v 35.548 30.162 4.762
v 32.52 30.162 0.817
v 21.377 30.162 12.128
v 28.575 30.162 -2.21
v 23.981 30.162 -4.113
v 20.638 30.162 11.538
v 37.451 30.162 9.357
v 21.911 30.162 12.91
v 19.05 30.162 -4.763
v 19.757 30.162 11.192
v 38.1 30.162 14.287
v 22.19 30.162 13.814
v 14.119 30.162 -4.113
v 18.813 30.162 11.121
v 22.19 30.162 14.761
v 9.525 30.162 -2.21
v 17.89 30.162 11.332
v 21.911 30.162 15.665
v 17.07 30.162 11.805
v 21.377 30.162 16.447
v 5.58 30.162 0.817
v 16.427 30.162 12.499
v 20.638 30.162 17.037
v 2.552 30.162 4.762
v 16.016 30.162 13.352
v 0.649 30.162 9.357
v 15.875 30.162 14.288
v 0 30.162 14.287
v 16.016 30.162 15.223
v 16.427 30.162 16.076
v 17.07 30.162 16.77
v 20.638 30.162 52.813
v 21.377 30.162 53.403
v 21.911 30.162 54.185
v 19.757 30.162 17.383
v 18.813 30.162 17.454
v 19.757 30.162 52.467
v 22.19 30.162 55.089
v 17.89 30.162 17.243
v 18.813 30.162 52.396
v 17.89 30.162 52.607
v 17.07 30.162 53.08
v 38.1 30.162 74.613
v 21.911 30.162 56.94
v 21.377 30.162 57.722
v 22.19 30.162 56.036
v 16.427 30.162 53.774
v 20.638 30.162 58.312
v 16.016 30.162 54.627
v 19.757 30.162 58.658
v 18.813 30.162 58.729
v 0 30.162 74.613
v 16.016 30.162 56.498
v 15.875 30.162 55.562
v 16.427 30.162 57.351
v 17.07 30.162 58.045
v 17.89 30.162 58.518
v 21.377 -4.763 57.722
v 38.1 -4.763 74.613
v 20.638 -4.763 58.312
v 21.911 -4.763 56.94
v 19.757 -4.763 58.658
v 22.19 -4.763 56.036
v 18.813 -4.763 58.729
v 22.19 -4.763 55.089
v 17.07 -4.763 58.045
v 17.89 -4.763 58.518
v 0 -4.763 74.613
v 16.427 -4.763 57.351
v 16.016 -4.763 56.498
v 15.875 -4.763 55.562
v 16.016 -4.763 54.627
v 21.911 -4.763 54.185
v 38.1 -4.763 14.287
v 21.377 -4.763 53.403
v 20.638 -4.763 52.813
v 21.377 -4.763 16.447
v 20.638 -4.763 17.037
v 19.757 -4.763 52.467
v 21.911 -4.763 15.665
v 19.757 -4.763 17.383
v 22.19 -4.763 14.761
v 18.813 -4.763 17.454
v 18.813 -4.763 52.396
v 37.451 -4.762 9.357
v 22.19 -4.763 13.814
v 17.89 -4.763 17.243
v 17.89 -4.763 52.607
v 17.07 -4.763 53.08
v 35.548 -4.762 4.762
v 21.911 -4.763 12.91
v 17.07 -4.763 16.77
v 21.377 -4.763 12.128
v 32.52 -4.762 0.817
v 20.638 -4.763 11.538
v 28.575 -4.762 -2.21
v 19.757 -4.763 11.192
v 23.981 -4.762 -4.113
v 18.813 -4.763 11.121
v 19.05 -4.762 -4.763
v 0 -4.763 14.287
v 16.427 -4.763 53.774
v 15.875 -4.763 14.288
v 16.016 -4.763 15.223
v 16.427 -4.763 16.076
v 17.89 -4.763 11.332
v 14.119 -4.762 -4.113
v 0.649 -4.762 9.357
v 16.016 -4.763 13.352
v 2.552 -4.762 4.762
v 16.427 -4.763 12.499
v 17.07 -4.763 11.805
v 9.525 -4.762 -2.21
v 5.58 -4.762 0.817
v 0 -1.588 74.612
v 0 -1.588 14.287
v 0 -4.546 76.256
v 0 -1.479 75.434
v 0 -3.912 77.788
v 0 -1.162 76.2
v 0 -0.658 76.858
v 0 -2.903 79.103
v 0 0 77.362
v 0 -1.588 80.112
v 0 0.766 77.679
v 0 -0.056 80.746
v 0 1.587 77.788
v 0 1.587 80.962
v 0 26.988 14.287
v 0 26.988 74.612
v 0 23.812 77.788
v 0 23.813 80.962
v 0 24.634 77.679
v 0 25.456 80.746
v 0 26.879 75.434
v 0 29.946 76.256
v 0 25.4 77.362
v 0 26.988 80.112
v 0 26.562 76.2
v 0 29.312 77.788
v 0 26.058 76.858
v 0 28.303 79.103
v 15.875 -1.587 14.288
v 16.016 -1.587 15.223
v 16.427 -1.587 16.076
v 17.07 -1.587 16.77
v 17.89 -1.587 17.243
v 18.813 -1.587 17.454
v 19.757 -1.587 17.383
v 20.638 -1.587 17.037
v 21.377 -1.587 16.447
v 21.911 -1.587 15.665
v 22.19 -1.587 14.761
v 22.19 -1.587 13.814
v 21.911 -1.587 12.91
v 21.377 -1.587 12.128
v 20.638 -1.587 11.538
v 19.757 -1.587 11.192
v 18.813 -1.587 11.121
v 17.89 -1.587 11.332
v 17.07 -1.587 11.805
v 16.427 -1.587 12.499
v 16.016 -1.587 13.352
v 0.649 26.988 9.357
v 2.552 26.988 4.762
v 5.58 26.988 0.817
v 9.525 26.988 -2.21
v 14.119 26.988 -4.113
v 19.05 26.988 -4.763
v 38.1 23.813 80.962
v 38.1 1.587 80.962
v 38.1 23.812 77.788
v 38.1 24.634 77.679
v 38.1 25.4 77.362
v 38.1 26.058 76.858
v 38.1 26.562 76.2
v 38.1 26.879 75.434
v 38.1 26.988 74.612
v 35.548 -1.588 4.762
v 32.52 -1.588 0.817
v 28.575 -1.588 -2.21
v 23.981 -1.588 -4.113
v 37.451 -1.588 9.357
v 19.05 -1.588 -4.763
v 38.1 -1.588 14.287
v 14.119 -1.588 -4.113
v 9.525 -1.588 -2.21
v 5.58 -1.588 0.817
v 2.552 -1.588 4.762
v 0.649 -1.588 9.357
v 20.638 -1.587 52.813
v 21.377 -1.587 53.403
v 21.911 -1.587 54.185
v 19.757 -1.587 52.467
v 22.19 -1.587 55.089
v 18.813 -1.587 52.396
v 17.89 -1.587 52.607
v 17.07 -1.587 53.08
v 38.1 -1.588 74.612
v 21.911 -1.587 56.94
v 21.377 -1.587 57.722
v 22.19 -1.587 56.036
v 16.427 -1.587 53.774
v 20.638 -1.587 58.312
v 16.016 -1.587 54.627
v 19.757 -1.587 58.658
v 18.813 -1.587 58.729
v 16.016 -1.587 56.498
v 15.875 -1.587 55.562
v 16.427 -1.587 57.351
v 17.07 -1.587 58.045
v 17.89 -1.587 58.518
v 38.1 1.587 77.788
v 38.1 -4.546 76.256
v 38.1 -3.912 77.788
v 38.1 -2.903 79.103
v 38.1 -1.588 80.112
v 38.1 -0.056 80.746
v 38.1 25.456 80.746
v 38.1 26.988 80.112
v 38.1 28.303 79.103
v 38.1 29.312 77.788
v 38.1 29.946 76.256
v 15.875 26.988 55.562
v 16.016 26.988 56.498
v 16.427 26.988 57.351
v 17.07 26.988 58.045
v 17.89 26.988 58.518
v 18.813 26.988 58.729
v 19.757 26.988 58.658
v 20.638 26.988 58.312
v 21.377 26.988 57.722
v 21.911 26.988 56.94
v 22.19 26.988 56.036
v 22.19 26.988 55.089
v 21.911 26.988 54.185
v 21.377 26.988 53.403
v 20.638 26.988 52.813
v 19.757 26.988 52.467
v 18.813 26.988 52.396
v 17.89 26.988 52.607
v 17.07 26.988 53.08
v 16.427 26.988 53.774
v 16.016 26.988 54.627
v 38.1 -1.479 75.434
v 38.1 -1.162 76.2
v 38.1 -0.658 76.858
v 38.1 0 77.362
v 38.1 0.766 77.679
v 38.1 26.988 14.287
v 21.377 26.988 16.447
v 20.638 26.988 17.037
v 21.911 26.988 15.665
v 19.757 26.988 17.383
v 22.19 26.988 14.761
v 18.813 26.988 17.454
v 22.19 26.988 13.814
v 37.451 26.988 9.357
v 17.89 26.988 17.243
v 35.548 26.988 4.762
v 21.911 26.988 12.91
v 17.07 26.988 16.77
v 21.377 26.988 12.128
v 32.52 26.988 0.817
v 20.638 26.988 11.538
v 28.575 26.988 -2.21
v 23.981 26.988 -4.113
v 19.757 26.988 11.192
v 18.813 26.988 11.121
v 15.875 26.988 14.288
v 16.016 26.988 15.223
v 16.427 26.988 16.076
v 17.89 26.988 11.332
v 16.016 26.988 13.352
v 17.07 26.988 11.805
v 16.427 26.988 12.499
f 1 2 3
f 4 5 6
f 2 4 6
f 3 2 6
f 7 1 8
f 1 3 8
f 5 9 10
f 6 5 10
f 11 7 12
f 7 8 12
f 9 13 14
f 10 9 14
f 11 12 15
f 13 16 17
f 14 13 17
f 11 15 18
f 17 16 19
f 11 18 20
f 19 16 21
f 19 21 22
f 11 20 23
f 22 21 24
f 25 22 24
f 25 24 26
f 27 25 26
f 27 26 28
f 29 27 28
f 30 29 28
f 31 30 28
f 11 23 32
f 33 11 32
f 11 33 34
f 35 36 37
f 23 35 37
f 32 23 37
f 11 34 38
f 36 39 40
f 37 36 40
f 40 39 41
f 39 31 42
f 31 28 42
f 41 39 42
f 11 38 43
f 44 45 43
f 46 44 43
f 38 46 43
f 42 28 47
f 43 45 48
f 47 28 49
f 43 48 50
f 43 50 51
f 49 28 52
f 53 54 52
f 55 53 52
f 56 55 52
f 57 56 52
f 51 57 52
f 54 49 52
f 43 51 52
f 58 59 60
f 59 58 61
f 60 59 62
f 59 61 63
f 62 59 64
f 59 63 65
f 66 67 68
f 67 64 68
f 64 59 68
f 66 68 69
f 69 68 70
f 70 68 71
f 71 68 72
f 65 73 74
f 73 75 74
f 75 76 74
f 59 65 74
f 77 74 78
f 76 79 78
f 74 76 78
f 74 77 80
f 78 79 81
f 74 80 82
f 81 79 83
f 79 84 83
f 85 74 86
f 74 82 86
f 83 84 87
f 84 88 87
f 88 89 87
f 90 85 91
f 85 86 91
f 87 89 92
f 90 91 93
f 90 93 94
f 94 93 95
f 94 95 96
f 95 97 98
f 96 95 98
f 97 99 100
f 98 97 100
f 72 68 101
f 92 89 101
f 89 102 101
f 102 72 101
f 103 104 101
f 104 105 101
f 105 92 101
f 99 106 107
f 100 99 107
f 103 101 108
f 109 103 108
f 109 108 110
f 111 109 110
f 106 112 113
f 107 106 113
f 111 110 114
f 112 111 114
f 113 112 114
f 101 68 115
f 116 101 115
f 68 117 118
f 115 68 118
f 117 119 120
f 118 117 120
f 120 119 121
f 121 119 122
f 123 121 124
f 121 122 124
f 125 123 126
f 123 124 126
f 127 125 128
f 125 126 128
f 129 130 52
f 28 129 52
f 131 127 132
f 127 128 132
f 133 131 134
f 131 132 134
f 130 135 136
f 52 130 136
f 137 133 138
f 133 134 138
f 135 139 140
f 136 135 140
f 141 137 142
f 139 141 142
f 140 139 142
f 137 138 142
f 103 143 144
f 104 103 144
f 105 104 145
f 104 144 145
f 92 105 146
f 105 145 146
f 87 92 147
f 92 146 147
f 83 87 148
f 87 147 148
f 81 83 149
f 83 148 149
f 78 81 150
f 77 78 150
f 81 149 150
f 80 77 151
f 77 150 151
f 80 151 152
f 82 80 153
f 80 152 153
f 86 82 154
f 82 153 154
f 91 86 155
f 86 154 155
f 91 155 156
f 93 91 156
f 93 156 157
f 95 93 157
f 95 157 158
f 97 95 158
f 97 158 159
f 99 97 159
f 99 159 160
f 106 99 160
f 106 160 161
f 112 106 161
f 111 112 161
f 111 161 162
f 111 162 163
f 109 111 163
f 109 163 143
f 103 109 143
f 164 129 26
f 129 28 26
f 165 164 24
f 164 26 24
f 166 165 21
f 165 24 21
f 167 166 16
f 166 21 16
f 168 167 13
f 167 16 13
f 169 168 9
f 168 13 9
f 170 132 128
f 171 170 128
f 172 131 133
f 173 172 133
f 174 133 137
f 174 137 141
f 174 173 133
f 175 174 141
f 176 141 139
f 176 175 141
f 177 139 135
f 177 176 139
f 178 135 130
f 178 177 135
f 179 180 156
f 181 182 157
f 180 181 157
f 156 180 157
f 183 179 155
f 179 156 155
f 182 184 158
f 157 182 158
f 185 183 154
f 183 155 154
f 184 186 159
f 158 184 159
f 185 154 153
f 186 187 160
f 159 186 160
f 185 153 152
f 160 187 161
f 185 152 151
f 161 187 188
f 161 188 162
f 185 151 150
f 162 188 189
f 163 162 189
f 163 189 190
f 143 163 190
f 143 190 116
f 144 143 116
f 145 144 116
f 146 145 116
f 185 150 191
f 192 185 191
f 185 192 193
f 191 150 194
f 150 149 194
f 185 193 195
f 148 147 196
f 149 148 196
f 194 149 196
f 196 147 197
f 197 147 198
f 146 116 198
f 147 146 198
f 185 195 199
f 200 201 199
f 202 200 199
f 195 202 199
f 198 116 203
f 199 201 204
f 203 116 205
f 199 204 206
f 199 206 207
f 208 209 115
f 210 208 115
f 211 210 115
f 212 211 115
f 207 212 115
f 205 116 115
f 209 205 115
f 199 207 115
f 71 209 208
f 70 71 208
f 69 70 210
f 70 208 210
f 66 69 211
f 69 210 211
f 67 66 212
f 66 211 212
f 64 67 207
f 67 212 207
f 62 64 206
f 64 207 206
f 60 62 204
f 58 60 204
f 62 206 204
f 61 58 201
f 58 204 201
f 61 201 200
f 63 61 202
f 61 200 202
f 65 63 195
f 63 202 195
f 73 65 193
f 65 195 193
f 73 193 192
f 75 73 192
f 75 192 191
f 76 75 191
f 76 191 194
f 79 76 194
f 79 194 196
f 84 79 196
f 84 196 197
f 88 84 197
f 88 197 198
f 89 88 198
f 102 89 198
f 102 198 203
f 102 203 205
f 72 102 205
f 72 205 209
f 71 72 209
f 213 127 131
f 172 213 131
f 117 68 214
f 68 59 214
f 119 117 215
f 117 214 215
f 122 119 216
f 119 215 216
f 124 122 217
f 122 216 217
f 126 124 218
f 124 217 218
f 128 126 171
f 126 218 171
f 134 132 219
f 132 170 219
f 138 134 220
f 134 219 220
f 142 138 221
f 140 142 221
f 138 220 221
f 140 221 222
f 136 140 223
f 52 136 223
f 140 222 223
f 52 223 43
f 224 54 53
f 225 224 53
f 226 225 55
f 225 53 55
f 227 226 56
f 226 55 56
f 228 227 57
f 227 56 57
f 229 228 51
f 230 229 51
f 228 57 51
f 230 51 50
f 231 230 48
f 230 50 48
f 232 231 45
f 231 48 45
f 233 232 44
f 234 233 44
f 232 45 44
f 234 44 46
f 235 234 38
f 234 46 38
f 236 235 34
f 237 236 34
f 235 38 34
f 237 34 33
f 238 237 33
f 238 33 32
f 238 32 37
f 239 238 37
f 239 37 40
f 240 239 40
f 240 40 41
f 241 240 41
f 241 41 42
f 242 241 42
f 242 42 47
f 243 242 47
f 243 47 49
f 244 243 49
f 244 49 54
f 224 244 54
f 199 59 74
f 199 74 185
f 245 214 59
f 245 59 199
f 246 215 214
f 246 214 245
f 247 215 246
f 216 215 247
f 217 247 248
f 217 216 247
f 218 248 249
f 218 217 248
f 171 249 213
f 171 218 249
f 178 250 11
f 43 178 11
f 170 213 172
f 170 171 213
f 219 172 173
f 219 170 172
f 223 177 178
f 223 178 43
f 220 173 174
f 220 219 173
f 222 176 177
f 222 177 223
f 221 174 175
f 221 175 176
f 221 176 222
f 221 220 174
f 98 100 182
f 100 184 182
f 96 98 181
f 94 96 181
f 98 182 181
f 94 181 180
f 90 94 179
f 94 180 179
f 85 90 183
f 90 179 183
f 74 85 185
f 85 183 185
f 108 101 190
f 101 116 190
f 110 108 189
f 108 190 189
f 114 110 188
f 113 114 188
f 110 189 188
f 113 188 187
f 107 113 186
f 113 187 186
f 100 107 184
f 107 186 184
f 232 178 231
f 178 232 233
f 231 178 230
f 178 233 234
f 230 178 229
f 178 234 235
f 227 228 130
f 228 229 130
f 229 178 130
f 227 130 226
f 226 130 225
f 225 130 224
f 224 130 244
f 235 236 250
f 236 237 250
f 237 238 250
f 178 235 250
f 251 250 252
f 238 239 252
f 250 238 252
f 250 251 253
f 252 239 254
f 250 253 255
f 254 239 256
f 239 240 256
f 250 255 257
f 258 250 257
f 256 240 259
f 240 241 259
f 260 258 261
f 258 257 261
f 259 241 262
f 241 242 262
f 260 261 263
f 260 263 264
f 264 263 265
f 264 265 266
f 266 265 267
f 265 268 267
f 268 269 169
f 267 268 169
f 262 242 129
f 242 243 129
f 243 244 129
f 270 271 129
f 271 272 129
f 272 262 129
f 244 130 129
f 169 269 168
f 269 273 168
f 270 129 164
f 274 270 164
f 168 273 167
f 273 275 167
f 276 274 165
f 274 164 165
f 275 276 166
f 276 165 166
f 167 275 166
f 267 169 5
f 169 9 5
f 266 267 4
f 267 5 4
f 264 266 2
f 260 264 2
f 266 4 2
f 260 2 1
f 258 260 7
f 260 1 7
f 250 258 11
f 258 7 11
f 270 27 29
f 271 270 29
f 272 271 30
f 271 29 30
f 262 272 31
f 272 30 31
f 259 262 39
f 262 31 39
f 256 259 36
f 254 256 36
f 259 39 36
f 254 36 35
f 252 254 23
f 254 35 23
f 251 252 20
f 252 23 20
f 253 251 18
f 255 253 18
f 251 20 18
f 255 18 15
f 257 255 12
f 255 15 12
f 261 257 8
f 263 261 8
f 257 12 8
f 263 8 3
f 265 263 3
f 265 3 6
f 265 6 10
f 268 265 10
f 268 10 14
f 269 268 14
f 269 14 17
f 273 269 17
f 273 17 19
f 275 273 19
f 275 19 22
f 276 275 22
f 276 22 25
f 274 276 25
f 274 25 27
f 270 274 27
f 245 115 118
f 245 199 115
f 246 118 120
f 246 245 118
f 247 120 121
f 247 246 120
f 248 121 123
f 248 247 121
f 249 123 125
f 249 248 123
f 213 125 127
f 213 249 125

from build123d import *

# Parameters (mm, degrees)
F1_DEPTH = 38.1
F2_R     = 3.175
F3_R     = 6.35
F4_R     = 19.04999
F5_R     = 3.175
F6_DEPTH = 34.926


# Not quite as in the source:
# - a fillet or chamfer is up to 0.001 mm smaller than in the source, because OpenCascade refuses the exact size


with BuildPart() as f1:
    # F0 (on Right) → F1 (new body)
    with BuildSketch(Plane.YZ):
        Polygon((-1.5875, -4.7625), (-1.5875, 77.7875), (26.9875, 77.7875), (26.9875, -4.7625), (30.1625, -4.7625), (30.1625, 80.9625), (-4.7625, 80.9625), (-4.7625, -4.7625), align=None)
    extrude(amount=F1_DEPTH)

    # F2
    f2_edges = [f1.edges().sort_by_distance(p)[0] for p in [
        (19.05, 26.9875, 77.7875),
        (19.05, -1.5875, 77.7875),
    ]]
    fillet(f2_edges, radius=F2_R)

    # F3
    f3_edges = [f1.edges().sort_by_distance(p)[0] for p in [
        (19.05, 30.1625, 80.9625),
        (19.05, -4.7625, 80.9625),
    ]]
    fillet(f3_edges, radius=F3_R)

    # F4 (radius 19.05 in the source; OpenCascade refuses exactly that, so slightly less here)
    f4_edges = [f1.edges().sort_by_distance(p)[0] for p in [
        (38.1, 28.575, -4.7625),
        (0, 28.575, -4.7625),
        (38.1, -3.175, -4.7625),
        (0, -3.175, -4.7625),
    ]]
    fillet(f4_edges, radius=F4_R)

    # F5 (on face) → F6 (cut, through all)
    with BuildSketch(Plane(origin=(0, 30.1625, 0), x_dir=(-1, 0, 0), z_dir=(0, 1, 0))):
        with Locations((-19.05, 14.2875)):
            Circle(F5_R)
        with Locations((-19.05, 55.5625)):
            Circle(F5_R)
    extrude(amount=-F6_DEPTH, mode=Mode.SUBTRACT)


solid = f1.part
